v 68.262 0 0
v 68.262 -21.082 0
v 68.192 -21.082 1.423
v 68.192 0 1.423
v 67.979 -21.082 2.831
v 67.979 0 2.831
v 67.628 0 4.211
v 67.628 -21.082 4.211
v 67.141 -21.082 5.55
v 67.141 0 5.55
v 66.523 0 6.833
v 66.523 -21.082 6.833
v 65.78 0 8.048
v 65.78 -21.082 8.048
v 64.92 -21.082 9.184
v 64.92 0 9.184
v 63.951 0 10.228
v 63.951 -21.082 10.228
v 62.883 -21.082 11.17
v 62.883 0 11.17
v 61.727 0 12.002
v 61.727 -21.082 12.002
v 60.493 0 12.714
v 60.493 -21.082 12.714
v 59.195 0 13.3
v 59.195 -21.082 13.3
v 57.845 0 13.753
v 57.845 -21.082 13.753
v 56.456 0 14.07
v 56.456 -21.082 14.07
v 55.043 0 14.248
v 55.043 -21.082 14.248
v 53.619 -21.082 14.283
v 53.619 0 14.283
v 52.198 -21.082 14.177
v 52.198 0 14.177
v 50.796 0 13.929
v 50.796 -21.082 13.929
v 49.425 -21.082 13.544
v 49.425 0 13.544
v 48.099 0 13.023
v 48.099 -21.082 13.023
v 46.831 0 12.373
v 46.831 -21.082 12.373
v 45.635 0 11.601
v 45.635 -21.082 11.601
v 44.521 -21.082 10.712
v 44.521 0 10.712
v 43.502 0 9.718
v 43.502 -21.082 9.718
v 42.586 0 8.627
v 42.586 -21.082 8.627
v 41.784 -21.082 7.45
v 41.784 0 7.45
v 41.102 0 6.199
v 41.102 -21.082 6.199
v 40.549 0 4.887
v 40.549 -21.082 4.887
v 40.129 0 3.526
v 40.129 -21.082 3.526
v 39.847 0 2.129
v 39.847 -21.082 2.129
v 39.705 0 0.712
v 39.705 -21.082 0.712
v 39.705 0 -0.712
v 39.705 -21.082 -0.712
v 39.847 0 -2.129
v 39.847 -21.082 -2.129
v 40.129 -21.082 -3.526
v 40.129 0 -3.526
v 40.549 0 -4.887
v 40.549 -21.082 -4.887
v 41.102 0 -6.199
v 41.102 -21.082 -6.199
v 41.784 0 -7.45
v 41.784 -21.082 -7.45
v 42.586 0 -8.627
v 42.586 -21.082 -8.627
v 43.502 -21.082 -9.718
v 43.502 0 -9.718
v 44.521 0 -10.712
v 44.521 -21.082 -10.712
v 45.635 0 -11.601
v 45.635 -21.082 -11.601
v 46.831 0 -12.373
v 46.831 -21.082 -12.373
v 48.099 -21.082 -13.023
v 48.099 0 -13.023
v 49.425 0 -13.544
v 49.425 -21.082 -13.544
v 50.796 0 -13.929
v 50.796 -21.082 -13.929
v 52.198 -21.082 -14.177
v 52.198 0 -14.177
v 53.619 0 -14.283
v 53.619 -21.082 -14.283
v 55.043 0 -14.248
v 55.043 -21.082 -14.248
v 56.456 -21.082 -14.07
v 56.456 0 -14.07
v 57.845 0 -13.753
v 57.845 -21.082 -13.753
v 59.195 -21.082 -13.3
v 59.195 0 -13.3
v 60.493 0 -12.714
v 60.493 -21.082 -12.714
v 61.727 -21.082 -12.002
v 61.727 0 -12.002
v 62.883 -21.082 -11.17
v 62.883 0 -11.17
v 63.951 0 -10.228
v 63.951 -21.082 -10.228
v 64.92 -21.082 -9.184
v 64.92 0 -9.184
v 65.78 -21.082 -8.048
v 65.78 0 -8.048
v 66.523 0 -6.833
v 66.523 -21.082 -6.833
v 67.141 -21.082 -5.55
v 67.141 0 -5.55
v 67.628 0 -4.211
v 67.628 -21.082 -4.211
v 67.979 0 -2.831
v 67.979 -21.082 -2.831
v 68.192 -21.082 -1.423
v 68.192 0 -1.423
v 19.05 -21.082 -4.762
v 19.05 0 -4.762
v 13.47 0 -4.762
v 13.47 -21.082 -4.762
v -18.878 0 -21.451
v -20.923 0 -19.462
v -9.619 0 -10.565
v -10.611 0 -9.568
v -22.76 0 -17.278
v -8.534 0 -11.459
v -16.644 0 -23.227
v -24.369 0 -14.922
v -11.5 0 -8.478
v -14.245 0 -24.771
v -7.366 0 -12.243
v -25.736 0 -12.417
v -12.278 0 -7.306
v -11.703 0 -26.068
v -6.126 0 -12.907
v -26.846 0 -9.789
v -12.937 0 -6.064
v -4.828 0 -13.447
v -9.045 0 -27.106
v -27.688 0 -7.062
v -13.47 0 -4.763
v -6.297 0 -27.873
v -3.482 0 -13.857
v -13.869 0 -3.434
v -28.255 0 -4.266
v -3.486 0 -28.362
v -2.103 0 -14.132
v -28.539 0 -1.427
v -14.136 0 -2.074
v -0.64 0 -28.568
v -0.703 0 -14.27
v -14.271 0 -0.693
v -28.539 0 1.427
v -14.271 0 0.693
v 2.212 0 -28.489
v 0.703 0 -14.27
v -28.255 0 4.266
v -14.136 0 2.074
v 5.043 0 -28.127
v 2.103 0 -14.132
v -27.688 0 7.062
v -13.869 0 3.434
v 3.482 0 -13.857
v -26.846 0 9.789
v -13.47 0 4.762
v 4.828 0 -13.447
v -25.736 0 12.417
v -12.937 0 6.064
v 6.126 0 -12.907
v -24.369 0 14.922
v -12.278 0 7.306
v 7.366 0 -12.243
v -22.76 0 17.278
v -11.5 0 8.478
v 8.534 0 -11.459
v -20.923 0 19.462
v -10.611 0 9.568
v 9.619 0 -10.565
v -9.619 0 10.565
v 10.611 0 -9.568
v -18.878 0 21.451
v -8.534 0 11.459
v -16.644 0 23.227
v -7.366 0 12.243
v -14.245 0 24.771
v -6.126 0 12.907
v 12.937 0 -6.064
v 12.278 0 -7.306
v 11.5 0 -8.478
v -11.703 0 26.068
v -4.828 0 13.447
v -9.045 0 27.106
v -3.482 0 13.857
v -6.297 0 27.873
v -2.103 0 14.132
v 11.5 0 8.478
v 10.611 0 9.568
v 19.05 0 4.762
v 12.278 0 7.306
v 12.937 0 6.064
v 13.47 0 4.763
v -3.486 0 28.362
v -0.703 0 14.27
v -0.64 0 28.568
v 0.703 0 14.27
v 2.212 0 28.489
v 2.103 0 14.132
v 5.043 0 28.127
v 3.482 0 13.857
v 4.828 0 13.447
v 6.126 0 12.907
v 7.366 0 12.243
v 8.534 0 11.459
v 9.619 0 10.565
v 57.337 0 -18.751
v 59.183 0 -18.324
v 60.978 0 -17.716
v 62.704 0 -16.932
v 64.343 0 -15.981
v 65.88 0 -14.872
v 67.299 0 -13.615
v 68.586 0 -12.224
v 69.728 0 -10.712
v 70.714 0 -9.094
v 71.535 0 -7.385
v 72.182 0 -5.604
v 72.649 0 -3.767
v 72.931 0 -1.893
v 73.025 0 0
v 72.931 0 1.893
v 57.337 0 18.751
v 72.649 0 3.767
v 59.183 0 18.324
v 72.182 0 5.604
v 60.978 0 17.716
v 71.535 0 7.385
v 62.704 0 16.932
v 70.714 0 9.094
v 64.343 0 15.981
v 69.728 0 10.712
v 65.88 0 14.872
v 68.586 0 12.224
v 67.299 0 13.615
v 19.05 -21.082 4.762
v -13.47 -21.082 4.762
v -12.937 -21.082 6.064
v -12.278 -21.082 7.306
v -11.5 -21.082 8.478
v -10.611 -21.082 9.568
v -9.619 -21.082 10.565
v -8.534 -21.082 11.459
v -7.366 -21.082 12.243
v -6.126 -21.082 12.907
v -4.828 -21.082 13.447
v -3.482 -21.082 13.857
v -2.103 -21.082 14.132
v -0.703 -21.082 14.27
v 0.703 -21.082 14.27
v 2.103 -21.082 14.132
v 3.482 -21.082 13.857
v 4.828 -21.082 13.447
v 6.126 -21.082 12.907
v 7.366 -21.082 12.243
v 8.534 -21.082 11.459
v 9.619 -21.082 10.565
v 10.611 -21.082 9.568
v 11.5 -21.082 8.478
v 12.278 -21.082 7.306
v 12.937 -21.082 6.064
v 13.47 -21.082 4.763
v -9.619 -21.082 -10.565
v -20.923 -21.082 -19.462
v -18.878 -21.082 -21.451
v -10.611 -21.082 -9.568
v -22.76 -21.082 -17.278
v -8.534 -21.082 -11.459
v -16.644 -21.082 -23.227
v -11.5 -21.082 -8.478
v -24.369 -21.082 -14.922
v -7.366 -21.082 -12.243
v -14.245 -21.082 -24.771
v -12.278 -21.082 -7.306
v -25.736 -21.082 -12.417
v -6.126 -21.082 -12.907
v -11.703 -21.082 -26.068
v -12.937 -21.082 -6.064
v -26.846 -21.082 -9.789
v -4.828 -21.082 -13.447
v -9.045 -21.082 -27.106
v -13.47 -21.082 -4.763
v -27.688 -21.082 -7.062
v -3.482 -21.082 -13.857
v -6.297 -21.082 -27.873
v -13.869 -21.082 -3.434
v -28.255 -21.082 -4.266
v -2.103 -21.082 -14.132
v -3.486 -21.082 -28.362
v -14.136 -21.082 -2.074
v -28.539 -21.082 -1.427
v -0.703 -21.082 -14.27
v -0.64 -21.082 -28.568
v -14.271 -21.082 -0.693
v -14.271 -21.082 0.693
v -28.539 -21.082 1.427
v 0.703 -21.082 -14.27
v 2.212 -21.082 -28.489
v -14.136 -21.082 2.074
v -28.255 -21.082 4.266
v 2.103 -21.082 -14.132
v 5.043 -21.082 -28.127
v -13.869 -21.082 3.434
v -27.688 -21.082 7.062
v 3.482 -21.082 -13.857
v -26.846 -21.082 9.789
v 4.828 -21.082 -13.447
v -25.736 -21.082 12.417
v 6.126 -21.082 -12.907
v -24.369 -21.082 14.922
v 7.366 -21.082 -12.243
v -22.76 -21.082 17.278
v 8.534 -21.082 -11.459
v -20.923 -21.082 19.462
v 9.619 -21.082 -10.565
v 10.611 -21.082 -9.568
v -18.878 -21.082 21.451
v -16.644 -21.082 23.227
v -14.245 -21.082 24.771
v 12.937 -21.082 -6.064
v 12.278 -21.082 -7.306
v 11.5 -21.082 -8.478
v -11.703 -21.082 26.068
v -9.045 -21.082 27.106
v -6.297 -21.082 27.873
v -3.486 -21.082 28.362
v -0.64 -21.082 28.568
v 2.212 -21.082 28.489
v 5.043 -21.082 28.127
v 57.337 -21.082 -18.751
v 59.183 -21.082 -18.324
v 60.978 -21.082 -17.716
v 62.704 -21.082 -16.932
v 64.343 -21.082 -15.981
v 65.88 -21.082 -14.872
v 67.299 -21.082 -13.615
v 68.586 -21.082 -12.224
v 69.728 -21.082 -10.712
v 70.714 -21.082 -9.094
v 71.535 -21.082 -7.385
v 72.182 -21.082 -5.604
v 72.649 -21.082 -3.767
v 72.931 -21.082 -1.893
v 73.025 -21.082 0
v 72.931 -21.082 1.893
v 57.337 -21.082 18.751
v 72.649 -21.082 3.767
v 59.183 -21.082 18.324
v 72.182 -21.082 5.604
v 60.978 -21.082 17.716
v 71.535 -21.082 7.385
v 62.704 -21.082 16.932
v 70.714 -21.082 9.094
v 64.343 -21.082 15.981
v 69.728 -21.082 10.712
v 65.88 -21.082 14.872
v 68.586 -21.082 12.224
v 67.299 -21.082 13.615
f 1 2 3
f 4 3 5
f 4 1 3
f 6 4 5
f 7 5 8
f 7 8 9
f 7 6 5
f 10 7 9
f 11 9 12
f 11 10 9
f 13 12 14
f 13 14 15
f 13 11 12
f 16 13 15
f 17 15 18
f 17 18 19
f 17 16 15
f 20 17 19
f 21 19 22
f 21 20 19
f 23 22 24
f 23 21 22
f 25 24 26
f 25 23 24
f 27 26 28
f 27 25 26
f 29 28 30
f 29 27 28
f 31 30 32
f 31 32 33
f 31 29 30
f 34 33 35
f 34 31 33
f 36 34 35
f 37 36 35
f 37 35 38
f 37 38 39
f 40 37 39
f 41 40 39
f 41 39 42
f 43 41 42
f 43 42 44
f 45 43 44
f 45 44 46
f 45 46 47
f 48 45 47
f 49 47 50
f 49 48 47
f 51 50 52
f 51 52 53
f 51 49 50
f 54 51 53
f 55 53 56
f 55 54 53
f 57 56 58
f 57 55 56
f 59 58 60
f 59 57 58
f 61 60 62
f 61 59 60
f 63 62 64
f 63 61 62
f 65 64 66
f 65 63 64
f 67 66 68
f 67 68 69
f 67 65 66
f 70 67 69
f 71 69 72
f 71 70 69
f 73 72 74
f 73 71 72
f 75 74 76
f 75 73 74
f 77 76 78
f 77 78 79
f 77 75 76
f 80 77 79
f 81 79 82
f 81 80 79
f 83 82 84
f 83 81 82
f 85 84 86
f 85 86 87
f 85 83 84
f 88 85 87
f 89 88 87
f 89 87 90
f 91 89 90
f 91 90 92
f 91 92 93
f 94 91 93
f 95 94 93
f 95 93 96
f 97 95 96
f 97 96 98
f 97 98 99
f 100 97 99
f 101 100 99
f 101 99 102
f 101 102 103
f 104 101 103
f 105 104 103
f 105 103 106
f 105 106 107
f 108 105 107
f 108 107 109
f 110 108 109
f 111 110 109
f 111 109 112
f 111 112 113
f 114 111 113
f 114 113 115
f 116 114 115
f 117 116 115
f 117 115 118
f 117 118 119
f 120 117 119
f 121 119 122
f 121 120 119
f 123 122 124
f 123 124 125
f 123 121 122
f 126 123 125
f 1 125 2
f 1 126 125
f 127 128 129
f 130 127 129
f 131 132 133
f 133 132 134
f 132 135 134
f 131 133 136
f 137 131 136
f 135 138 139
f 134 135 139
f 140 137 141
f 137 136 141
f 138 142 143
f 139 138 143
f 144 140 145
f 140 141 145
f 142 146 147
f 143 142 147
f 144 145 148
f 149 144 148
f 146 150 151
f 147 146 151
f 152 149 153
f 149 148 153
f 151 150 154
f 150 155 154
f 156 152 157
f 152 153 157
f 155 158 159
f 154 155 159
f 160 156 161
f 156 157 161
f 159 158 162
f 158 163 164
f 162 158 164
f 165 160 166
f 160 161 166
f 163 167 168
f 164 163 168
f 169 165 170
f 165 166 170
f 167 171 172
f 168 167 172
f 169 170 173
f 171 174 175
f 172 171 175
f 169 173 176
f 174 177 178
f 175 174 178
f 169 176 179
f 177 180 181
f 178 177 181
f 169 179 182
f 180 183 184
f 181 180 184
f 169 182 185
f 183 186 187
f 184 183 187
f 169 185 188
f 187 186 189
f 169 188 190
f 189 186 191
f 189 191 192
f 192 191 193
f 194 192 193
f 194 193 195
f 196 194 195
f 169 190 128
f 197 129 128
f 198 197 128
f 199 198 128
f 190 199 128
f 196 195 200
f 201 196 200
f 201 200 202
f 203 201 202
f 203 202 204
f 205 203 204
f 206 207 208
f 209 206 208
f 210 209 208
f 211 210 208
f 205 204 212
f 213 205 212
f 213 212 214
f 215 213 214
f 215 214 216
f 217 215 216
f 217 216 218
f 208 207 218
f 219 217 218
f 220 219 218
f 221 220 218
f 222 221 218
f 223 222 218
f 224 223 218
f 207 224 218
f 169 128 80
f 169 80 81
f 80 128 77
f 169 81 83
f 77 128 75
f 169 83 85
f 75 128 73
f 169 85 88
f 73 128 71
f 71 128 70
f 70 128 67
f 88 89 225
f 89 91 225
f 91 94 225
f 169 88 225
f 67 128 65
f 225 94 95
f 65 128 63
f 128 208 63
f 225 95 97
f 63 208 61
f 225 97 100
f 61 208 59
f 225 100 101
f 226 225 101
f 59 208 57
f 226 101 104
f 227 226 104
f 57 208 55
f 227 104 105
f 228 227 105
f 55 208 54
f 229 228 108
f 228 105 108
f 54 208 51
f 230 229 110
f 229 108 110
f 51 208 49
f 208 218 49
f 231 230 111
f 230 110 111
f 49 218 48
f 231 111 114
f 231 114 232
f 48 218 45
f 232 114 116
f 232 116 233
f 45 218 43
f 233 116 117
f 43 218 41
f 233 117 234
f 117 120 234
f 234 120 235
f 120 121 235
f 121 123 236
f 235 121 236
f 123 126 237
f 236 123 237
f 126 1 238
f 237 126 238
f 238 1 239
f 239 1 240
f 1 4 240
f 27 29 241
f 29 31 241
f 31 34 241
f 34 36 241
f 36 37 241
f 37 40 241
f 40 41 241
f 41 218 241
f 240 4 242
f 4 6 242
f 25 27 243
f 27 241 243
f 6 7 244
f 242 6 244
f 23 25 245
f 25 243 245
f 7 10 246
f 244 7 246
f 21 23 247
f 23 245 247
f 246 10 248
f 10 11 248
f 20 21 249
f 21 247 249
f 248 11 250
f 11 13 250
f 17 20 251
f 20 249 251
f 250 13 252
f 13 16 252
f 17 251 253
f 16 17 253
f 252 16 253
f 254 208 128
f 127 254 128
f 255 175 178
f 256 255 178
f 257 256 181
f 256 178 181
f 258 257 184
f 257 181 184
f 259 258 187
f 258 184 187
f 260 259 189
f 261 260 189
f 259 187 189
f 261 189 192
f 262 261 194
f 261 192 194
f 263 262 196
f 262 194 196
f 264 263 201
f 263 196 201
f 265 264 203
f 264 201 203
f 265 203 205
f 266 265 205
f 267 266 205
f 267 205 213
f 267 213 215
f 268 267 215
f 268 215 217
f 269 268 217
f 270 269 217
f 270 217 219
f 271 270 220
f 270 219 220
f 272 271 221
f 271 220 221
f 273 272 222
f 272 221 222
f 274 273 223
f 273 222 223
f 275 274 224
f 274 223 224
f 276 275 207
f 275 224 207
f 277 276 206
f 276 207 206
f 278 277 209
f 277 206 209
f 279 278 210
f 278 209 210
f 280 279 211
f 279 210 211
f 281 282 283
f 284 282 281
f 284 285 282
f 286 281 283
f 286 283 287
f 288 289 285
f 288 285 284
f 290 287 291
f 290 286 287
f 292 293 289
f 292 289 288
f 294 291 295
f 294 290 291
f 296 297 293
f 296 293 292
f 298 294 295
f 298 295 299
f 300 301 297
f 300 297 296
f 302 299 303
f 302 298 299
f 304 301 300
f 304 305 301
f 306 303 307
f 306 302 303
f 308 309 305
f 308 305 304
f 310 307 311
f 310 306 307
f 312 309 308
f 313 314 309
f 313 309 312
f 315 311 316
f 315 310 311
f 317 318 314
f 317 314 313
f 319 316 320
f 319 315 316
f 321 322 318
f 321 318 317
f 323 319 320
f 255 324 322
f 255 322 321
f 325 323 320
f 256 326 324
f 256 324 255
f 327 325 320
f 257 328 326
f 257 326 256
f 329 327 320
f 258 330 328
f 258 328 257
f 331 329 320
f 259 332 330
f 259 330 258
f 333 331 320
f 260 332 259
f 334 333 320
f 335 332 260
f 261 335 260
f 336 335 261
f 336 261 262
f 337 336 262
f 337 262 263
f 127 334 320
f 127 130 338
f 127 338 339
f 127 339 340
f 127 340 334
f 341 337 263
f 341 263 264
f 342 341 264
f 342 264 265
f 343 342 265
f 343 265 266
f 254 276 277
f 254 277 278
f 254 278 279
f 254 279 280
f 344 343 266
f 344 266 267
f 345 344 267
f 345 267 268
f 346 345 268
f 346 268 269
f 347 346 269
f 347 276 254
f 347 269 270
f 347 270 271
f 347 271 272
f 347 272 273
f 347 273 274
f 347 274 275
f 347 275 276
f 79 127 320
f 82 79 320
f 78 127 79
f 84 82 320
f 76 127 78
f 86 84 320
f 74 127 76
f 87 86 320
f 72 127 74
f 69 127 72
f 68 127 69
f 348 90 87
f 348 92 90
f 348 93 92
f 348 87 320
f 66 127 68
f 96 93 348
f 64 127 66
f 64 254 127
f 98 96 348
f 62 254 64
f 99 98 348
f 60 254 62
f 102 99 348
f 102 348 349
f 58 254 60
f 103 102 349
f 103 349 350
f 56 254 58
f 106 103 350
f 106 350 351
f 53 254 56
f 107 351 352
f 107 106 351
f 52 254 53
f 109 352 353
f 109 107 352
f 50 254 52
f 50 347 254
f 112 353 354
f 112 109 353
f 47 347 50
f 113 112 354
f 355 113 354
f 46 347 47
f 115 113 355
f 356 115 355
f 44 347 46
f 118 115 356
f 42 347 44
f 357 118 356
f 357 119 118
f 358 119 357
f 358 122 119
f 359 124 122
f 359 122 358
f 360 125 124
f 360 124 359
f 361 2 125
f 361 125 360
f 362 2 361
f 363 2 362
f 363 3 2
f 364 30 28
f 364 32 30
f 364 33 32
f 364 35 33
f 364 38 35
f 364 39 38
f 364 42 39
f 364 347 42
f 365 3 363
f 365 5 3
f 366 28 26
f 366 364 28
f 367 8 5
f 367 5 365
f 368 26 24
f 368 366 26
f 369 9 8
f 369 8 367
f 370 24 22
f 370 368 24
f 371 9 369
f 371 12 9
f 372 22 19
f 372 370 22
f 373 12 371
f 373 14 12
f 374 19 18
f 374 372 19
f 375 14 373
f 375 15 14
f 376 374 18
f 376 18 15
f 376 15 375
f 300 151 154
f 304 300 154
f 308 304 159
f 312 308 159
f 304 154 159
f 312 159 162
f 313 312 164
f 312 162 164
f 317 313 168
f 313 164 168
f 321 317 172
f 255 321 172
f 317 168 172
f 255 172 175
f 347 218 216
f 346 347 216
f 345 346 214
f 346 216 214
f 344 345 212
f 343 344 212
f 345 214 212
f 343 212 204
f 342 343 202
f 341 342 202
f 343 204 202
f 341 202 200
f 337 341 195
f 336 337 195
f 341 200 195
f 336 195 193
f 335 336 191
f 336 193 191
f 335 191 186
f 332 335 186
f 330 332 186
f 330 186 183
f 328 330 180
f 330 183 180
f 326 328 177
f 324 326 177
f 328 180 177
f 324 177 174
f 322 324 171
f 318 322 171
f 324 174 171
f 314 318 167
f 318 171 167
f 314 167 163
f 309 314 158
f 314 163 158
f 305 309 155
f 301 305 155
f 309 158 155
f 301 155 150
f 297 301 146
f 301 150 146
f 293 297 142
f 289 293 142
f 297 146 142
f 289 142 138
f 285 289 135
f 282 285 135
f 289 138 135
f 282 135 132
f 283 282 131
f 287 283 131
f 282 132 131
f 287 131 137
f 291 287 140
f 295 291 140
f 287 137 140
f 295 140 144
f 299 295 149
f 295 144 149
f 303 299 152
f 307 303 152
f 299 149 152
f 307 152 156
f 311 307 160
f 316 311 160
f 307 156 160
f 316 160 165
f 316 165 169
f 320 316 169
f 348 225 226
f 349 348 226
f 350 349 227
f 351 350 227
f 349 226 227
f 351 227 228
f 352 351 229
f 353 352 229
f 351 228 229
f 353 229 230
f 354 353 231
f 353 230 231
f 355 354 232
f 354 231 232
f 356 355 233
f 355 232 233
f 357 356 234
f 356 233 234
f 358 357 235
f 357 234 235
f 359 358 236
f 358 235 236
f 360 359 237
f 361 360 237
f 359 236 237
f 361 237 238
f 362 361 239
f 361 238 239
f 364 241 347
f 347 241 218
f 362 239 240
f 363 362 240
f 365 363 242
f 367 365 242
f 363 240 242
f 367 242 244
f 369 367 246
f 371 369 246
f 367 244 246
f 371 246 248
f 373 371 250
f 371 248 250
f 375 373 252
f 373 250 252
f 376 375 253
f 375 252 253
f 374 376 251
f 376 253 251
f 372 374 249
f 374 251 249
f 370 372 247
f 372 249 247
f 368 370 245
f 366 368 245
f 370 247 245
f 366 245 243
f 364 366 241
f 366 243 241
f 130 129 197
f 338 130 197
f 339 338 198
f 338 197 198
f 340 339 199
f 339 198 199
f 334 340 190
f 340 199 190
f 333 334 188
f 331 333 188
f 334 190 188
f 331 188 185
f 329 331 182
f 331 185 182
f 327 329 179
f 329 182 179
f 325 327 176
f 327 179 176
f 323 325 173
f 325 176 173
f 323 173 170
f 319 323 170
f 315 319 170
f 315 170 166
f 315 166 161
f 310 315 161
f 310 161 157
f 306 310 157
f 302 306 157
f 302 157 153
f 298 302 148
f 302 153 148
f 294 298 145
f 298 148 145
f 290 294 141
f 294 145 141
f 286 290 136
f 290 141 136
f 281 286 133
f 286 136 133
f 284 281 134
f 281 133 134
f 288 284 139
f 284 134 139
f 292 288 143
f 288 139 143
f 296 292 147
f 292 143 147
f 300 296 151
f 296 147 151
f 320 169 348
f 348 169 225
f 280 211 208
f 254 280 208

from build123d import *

# Parameters (mm, degrees)
F0_R     = 14.2875
F1_DEPTH = 21.082


with BuildPart() as f1:
    # F0 (on Front) → F1 (new body)
    with BuildSketch(Plane.XZ):
        with BuildLine():
            ThreePointArc((5.042647, -28.126541), (21.916025, -18.336262), (28.575, 0))
            ThreePointArc((28.575, 0), (21.916025, 18.336262), (5.042647, 28.126541))
            ThreePointArc((5.042647, 28.126541), (-28.575, 0), (5.042647, -28.126541))
        make_face()
        with BuildLine():
            ThreePointArc((-13.470384, 4.7625), (0, 14.2875), (13.470384, 4.7625))
            Line((13.470384, 4.7625), (19.05, 4.7625))
            Line((19.05, 4.7625), (19.05, -4.7625))
            Line((19.05, -4.7625), (13.470384, -4.7625))
            ThreePointArc((13.470384, -4.7625), (0, -14.2875), (-13.470384, -4.7625))
            Line((-13.470384, -4.7625), (-19.05, -4.7625))
            Line((-19.05, -4.7625), (-19.05, 4.7625))
            Line((-19.05, 4.7625), (-13.470384, 4.7625))
        make_face(mode=Mode.SUBTRACT)
        with BuildLine():
            ThreePointArc((5.042647, 28.126541), (21.916025, 18.336262), (28.575, 0))
            ThreePointArc((28.575, 0), (21.916025, -18.336262), (5.042647, -28.126541))
            Line((5.042647, -28.126541), (57.336765, -18.751028))
            ThreePointArc((57.336765, -18.751028), (34.925, 0), (57.336765, 18.751028))
            Line((57.336765, 18.751028), (5.042647, 28.126541))
        make_face()
        with BuildLine():
            ThreePointArc((73.025, 0), (68.585683, 12.224174), (57.336765, 18.751028))
            ThreePointArc((57.336765, 18.751028), (34.925, 0), (57.336765, -18.751028))
            ThreePointArc((57.336765, -18.751028), (68.585683, -12.224174), (73.025, 0))
        make_face()
        with Locations((53.975, 0)):
            Circle(F0_R, mode=Mode.SUBTRACT)
        with BuildLine():
            ThreePointArc((-13.470384, -4.7625), (-14.2875, 0), (-13.470384, 4.7625))
            Line((-13.470384, 4.7625), (-19.05, 4.7625))
            Line((-19.05, 4.7625), (-19.05, -4.7625))
            Line((-19.05, -4.7625), (-13.470384, -4.7625))
        make_face()
    extrude(amount=F1_DEPTH)


solid = f1.part
